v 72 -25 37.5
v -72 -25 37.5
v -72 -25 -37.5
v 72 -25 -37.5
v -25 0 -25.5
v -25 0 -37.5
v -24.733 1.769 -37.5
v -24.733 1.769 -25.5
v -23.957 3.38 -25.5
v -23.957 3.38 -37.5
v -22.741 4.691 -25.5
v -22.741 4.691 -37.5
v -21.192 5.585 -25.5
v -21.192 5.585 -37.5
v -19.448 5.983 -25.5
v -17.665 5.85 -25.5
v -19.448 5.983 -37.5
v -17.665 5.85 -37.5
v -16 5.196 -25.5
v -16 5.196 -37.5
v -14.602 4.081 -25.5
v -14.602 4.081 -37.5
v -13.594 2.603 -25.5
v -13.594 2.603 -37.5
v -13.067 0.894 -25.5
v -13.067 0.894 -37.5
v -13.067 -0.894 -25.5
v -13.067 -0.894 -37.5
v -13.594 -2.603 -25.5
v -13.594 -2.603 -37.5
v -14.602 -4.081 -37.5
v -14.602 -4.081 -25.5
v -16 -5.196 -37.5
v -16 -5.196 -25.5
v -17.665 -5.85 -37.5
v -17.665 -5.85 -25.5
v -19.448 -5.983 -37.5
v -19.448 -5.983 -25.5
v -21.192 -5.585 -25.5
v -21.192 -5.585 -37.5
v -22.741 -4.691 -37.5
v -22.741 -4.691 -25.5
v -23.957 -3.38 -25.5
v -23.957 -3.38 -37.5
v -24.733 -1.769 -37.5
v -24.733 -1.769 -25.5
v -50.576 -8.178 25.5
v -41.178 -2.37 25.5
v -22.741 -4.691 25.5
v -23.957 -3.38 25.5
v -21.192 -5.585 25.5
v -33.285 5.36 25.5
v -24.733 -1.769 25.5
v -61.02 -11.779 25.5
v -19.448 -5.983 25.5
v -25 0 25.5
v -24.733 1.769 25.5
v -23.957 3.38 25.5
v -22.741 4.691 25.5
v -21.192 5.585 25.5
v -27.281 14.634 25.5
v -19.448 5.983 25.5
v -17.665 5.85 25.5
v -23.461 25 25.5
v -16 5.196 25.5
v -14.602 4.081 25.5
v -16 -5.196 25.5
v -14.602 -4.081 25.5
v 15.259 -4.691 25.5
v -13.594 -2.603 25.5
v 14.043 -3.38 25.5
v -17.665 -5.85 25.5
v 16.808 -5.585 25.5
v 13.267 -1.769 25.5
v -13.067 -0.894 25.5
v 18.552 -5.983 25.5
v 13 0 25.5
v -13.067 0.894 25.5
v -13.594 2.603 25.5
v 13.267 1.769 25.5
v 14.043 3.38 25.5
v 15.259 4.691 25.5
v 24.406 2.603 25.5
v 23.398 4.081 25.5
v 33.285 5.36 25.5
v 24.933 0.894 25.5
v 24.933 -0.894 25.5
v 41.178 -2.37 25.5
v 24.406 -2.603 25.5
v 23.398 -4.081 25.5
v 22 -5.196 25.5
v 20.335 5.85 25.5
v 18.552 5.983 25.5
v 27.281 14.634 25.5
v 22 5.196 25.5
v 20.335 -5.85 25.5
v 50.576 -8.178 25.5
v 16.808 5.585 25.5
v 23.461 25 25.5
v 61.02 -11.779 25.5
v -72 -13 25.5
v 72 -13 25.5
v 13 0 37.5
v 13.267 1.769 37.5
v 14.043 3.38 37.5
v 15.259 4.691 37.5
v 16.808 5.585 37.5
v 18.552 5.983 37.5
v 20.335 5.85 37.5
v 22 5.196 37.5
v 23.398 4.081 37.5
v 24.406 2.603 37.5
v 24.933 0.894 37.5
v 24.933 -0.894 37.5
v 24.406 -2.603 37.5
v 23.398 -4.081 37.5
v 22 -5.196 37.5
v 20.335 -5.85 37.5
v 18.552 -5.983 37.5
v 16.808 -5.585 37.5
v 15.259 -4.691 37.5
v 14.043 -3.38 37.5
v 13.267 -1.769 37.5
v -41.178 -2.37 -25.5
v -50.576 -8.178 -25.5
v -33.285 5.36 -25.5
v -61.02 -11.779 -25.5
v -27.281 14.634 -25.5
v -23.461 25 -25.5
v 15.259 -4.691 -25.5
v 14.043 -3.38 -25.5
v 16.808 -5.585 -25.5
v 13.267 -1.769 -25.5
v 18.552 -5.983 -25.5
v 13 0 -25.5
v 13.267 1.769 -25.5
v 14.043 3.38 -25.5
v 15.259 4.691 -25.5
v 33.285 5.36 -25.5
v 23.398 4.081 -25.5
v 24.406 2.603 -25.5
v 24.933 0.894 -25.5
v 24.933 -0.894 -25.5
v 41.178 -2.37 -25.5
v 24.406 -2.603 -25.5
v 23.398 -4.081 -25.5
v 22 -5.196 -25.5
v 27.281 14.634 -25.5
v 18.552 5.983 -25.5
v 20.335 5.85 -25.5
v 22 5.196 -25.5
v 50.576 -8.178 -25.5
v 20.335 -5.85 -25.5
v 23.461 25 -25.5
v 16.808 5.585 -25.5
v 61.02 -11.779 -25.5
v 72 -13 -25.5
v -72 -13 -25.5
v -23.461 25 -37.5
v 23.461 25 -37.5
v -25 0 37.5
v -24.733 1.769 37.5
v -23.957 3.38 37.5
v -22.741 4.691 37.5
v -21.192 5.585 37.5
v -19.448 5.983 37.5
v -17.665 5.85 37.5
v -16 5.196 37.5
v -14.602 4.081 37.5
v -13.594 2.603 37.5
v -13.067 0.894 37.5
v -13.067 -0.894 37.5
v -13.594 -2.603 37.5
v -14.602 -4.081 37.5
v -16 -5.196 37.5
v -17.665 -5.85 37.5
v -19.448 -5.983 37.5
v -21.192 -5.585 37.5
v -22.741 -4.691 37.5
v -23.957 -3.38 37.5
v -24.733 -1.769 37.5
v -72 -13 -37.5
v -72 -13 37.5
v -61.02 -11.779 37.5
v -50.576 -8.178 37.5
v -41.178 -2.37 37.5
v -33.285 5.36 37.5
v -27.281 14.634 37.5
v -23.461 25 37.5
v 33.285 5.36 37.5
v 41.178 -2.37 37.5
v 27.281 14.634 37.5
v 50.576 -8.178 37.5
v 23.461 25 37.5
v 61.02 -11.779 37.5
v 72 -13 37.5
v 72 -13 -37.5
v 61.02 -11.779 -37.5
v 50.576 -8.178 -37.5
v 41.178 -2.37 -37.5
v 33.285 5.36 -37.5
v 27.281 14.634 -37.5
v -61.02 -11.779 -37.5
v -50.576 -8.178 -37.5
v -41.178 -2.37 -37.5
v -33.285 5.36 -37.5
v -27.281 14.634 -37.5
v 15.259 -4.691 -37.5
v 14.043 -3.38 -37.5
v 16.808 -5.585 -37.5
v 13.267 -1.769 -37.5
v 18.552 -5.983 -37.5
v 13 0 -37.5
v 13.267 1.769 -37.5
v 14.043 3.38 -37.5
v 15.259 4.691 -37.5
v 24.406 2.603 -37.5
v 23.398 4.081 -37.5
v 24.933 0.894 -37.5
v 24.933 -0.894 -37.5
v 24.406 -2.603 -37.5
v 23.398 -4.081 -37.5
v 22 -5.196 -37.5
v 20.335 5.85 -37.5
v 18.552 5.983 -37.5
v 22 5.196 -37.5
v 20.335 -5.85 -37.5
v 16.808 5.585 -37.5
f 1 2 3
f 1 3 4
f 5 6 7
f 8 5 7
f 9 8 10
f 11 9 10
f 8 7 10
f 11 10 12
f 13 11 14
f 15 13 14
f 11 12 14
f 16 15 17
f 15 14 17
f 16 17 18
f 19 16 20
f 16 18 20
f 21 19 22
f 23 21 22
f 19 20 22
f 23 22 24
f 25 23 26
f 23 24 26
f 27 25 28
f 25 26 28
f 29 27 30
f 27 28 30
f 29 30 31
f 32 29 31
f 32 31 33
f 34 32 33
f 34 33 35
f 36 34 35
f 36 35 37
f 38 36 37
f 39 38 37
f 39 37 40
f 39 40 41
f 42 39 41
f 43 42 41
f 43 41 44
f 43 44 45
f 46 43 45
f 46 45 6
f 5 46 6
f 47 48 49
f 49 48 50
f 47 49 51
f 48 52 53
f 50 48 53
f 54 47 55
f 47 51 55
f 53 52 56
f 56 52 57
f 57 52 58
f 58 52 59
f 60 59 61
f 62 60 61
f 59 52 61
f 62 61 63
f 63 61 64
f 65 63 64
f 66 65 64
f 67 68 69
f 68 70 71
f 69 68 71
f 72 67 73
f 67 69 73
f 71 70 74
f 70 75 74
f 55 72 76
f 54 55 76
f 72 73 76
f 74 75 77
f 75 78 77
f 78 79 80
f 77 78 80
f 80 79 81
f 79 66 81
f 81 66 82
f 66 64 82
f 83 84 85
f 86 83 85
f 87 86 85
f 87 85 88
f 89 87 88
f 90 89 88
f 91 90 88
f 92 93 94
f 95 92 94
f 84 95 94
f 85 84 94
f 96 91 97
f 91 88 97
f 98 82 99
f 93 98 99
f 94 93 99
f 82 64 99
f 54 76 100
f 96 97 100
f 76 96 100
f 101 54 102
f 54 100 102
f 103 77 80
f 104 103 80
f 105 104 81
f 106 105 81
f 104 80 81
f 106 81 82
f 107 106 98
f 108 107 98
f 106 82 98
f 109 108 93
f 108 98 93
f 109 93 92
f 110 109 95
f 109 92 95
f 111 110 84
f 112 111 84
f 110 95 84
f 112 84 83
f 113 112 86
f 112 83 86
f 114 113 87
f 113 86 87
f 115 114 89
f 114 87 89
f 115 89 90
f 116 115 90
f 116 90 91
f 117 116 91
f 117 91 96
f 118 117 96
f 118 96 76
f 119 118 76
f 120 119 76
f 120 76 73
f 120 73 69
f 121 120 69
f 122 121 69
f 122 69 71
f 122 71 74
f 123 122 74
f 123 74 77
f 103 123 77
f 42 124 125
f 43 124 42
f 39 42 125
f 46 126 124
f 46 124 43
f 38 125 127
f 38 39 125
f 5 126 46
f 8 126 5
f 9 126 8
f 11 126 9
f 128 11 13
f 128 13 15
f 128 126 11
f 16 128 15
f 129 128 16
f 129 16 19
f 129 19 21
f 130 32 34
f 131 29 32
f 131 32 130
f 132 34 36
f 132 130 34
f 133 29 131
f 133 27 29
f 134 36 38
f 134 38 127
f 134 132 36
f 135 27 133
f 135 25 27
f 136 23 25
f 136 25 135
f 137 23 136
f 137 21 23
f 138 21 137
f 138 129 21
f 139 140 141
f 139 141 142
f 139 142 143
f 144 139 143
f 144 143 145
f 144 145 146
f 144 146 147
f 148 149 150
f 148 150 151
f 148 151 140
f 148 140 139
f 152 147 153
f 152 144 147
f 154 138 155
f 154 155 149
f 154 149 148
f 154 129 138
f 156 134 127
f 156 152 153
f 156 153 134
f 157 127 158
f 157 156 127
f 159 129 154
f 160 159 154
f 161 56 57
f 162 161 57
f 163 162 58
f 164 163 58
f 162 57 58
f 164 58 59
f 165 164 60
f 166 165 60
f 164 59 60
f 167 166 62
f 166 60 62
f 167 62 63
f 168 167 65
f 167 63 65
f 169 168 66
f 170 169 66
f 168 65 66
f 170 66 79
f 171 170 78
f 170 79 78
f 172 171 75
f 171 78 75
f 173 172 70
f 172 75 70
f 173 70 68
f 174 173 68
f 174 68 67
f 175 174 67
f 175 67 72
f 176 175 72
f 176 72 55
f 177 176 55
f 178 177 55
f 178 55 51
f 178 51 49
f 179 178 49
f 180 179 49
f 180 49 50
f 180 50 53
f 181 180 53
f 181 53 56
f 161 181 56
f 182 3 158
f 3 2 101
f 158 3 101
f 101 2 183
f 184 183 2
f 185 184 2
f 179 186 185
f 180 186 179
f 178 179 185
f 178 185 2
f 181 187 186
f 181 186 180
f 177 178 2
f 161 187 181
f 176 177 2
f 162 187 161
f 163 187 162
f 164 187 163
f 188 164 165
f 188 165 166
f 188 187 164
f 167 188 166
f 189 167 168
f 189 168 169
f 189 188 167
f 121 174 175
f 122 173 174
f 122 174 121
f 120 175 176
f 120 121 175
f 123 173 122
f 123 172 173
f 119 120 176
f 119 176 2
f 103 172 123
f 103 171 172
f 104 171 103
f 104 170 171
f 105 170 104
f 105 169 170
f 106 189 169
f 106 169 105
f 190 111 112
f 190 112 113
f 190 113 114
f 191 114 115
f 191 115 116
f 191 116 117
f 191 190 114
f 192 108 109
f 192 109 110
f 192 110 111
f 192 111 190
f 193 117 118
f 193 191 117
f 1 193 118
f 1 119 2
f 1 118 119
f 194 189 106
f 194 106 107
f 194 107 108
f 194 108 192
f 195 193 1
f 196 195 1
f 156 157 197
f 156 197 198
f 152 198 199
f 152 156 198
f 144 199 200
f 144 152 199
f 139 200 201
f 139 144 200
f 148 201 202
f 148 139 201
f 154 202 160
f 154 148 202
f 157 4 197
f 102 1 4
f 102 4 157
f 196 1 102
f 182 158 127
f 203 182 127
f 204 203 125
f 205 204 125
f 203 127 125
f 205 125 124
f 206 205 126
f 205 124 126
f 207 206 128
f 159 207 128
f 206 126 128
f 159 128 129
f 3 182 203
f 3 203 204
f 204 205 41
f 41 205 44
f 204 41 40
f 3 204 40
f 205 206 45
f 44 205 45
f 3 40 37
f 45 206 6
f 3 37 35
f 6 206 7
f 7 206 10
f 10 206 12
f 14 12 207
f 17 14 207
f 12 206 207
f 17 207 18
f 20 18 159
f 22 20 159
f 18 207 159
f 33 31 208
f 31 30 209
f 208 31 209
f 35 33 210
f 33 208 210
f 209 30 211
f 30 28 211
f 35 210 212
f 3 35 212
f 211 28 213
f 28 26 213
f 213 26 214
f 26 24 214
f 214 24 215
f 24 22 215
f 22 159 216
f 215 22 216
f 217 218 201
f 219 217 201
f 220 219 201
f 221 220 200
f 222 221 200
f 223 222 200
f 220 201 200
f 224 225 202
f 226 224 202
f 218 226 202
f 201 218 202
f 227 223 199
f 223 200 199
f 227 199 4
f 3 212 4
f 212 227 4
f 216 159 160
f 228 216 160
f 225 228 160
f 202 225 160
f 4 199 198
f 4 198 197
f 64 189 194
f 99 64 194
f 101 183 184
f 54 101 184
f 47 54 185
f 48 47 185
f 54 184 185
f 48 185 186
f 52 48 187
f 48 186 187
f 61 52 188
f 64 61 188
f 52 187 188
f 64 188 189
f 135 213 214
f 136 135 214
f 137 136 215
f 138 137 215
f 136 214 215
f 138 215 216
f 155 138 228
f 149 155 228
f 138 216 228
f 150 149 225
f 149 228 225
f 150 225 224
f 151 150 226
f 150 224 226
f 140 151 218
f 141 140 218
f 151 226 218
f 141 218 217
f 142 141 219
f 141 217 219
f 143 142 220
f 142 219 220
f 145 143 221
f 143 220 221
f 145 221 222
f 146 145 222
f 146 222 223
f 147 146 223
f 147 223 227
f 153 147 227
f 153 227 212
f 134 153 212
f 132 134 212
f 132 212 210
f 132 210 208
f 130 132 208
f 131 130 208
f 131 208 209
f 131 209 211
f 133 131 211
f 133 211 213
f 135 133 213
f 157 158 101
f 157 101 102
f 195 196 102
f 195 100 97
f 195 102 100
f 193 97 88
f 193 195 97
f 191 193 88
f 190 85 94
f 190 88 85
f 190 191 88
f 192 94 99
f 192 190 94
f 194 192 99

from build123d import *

# Parameters (mm, degrees)
SKETCH1_W           = 144
SKETCH1_H           = 50
BOSS_EXTRUDE1_DEPTH = 37.5
CUT_EXTRUDE1_DEPTH  = 75
SKETCH3_W           = 144
SKETCH3_H           = 51
CUT_EXTRUDE2_DEPTH  = 38
HOLE1_D             = 12


with BuildPart() as part:
    # Sketch1 → Boss-Extrude1 (new, symmetric)
    with BuildSketch(Plane.XY):
        Rectangle(SKETCH1_W, SKETCH1_H)
    extrude(amount=BOSS_EXTRUDE1_DEPTH, both=True)

    # Sketch2 → Cut-Extrude1 (cut)
    with BuildSketch(Plane.XY.offset(37.5)):
        with BuildLine():
            Line((-23.461355602, 25), (-72, 25))
            Line((-72, 25), (-72, -13))
            ThreePointArc((-72, -13), (-41.177929985, -2.37003937), (-23.461355602, 25))
        make_face()
        with BuildLine():
            Line((72, 25), (72, -13))
            ThreePointArc((72, -13), (41.177929985, -2.37003937), (23.461355602, 25))
            Line((23.461355602, 25), (72, 25))
        make_face()
    extrude(amount=-CUT_EXTRUDE1_DEPTH, mode=Mode.SUBTRACT)

    # Sketch3 → Cut-Extrude2 (cut)
    with BuildSketch(Plane(origin=(0, 25, 0), x_dir=(1, 0, 0), z_dir=(0, 1, 0))):
        Rectangle(SKETCH3_W, SKETCH3_H)
    extrude(amount=-CUT_EXTRUDE2_DEPTH, mode=Mode.SUBTRACT)

    # Hole1 (through all)
    with Locations(Plane.XY.offset(37.5)):
        with Locations((19, 0), (-19, 0)):
            Hole(HOLE1_D / 2)


solid = part.part
